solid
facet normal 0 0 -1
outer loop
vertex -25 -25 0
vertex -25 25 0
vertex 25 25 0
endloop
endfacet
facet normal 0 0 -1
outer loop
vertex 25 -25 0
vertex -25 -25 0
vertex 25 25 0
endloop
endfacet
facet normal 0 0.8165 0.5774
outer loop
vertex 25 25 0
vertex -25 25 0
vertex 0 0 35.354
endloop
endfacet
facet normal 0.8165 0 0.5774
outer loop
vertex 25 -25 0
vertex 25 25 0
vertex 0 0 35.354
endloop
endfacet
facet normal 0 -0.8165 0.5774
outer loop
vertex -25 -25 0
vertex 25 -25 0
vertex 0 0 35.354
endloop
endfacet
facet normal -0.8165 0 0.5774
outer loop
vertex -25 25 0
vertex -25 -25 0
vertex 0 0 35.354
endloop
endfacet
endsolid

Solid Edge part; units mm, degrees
sketch "Sketch1" plane through (0, 0, 0) normal (0, 0, 1) x (1, 0, 0)
  line L0 (-25, -25) -> (25, -25)
  line L1 (25, -25) -> (25, 25)
  line L2 (25, 25) -> (-25, 25)
  line L3 (-25, 25) -> (-25, -25)
extrude "Protrusion1" add sketch "Sketch1" along normal blind 44.9981
sketch "Sketch2" plane through (0, 0, 0) normal (1, 0, 0) x (0, 1, 0)
  line L0 (-25, 0) -> (0, 35.3538)
extrude "ExtrudedCutout_1" cut sketch "Sketch2" against normal blind 70.8899 material side at (0, -12.5408, 17.7058)
sketch "Sketch3" plane through (0, 0, 0) normal (1, 0, 0) x (0, 1, 0)
  line L0 (-25, 0) -> (0, 35.3538)
extrude "ExtrudedCutout_2" cut sketch "Sketch3" along normal blind 62.8041 material side at (0, -12.5408, 17.7058)
pattern_circular "Pattern1" count 4 over 360 about axis through (0, 0, 0) along (0, 0, -1) of "ExtrudedCutout_2", "ExtrudedCutout_1"
